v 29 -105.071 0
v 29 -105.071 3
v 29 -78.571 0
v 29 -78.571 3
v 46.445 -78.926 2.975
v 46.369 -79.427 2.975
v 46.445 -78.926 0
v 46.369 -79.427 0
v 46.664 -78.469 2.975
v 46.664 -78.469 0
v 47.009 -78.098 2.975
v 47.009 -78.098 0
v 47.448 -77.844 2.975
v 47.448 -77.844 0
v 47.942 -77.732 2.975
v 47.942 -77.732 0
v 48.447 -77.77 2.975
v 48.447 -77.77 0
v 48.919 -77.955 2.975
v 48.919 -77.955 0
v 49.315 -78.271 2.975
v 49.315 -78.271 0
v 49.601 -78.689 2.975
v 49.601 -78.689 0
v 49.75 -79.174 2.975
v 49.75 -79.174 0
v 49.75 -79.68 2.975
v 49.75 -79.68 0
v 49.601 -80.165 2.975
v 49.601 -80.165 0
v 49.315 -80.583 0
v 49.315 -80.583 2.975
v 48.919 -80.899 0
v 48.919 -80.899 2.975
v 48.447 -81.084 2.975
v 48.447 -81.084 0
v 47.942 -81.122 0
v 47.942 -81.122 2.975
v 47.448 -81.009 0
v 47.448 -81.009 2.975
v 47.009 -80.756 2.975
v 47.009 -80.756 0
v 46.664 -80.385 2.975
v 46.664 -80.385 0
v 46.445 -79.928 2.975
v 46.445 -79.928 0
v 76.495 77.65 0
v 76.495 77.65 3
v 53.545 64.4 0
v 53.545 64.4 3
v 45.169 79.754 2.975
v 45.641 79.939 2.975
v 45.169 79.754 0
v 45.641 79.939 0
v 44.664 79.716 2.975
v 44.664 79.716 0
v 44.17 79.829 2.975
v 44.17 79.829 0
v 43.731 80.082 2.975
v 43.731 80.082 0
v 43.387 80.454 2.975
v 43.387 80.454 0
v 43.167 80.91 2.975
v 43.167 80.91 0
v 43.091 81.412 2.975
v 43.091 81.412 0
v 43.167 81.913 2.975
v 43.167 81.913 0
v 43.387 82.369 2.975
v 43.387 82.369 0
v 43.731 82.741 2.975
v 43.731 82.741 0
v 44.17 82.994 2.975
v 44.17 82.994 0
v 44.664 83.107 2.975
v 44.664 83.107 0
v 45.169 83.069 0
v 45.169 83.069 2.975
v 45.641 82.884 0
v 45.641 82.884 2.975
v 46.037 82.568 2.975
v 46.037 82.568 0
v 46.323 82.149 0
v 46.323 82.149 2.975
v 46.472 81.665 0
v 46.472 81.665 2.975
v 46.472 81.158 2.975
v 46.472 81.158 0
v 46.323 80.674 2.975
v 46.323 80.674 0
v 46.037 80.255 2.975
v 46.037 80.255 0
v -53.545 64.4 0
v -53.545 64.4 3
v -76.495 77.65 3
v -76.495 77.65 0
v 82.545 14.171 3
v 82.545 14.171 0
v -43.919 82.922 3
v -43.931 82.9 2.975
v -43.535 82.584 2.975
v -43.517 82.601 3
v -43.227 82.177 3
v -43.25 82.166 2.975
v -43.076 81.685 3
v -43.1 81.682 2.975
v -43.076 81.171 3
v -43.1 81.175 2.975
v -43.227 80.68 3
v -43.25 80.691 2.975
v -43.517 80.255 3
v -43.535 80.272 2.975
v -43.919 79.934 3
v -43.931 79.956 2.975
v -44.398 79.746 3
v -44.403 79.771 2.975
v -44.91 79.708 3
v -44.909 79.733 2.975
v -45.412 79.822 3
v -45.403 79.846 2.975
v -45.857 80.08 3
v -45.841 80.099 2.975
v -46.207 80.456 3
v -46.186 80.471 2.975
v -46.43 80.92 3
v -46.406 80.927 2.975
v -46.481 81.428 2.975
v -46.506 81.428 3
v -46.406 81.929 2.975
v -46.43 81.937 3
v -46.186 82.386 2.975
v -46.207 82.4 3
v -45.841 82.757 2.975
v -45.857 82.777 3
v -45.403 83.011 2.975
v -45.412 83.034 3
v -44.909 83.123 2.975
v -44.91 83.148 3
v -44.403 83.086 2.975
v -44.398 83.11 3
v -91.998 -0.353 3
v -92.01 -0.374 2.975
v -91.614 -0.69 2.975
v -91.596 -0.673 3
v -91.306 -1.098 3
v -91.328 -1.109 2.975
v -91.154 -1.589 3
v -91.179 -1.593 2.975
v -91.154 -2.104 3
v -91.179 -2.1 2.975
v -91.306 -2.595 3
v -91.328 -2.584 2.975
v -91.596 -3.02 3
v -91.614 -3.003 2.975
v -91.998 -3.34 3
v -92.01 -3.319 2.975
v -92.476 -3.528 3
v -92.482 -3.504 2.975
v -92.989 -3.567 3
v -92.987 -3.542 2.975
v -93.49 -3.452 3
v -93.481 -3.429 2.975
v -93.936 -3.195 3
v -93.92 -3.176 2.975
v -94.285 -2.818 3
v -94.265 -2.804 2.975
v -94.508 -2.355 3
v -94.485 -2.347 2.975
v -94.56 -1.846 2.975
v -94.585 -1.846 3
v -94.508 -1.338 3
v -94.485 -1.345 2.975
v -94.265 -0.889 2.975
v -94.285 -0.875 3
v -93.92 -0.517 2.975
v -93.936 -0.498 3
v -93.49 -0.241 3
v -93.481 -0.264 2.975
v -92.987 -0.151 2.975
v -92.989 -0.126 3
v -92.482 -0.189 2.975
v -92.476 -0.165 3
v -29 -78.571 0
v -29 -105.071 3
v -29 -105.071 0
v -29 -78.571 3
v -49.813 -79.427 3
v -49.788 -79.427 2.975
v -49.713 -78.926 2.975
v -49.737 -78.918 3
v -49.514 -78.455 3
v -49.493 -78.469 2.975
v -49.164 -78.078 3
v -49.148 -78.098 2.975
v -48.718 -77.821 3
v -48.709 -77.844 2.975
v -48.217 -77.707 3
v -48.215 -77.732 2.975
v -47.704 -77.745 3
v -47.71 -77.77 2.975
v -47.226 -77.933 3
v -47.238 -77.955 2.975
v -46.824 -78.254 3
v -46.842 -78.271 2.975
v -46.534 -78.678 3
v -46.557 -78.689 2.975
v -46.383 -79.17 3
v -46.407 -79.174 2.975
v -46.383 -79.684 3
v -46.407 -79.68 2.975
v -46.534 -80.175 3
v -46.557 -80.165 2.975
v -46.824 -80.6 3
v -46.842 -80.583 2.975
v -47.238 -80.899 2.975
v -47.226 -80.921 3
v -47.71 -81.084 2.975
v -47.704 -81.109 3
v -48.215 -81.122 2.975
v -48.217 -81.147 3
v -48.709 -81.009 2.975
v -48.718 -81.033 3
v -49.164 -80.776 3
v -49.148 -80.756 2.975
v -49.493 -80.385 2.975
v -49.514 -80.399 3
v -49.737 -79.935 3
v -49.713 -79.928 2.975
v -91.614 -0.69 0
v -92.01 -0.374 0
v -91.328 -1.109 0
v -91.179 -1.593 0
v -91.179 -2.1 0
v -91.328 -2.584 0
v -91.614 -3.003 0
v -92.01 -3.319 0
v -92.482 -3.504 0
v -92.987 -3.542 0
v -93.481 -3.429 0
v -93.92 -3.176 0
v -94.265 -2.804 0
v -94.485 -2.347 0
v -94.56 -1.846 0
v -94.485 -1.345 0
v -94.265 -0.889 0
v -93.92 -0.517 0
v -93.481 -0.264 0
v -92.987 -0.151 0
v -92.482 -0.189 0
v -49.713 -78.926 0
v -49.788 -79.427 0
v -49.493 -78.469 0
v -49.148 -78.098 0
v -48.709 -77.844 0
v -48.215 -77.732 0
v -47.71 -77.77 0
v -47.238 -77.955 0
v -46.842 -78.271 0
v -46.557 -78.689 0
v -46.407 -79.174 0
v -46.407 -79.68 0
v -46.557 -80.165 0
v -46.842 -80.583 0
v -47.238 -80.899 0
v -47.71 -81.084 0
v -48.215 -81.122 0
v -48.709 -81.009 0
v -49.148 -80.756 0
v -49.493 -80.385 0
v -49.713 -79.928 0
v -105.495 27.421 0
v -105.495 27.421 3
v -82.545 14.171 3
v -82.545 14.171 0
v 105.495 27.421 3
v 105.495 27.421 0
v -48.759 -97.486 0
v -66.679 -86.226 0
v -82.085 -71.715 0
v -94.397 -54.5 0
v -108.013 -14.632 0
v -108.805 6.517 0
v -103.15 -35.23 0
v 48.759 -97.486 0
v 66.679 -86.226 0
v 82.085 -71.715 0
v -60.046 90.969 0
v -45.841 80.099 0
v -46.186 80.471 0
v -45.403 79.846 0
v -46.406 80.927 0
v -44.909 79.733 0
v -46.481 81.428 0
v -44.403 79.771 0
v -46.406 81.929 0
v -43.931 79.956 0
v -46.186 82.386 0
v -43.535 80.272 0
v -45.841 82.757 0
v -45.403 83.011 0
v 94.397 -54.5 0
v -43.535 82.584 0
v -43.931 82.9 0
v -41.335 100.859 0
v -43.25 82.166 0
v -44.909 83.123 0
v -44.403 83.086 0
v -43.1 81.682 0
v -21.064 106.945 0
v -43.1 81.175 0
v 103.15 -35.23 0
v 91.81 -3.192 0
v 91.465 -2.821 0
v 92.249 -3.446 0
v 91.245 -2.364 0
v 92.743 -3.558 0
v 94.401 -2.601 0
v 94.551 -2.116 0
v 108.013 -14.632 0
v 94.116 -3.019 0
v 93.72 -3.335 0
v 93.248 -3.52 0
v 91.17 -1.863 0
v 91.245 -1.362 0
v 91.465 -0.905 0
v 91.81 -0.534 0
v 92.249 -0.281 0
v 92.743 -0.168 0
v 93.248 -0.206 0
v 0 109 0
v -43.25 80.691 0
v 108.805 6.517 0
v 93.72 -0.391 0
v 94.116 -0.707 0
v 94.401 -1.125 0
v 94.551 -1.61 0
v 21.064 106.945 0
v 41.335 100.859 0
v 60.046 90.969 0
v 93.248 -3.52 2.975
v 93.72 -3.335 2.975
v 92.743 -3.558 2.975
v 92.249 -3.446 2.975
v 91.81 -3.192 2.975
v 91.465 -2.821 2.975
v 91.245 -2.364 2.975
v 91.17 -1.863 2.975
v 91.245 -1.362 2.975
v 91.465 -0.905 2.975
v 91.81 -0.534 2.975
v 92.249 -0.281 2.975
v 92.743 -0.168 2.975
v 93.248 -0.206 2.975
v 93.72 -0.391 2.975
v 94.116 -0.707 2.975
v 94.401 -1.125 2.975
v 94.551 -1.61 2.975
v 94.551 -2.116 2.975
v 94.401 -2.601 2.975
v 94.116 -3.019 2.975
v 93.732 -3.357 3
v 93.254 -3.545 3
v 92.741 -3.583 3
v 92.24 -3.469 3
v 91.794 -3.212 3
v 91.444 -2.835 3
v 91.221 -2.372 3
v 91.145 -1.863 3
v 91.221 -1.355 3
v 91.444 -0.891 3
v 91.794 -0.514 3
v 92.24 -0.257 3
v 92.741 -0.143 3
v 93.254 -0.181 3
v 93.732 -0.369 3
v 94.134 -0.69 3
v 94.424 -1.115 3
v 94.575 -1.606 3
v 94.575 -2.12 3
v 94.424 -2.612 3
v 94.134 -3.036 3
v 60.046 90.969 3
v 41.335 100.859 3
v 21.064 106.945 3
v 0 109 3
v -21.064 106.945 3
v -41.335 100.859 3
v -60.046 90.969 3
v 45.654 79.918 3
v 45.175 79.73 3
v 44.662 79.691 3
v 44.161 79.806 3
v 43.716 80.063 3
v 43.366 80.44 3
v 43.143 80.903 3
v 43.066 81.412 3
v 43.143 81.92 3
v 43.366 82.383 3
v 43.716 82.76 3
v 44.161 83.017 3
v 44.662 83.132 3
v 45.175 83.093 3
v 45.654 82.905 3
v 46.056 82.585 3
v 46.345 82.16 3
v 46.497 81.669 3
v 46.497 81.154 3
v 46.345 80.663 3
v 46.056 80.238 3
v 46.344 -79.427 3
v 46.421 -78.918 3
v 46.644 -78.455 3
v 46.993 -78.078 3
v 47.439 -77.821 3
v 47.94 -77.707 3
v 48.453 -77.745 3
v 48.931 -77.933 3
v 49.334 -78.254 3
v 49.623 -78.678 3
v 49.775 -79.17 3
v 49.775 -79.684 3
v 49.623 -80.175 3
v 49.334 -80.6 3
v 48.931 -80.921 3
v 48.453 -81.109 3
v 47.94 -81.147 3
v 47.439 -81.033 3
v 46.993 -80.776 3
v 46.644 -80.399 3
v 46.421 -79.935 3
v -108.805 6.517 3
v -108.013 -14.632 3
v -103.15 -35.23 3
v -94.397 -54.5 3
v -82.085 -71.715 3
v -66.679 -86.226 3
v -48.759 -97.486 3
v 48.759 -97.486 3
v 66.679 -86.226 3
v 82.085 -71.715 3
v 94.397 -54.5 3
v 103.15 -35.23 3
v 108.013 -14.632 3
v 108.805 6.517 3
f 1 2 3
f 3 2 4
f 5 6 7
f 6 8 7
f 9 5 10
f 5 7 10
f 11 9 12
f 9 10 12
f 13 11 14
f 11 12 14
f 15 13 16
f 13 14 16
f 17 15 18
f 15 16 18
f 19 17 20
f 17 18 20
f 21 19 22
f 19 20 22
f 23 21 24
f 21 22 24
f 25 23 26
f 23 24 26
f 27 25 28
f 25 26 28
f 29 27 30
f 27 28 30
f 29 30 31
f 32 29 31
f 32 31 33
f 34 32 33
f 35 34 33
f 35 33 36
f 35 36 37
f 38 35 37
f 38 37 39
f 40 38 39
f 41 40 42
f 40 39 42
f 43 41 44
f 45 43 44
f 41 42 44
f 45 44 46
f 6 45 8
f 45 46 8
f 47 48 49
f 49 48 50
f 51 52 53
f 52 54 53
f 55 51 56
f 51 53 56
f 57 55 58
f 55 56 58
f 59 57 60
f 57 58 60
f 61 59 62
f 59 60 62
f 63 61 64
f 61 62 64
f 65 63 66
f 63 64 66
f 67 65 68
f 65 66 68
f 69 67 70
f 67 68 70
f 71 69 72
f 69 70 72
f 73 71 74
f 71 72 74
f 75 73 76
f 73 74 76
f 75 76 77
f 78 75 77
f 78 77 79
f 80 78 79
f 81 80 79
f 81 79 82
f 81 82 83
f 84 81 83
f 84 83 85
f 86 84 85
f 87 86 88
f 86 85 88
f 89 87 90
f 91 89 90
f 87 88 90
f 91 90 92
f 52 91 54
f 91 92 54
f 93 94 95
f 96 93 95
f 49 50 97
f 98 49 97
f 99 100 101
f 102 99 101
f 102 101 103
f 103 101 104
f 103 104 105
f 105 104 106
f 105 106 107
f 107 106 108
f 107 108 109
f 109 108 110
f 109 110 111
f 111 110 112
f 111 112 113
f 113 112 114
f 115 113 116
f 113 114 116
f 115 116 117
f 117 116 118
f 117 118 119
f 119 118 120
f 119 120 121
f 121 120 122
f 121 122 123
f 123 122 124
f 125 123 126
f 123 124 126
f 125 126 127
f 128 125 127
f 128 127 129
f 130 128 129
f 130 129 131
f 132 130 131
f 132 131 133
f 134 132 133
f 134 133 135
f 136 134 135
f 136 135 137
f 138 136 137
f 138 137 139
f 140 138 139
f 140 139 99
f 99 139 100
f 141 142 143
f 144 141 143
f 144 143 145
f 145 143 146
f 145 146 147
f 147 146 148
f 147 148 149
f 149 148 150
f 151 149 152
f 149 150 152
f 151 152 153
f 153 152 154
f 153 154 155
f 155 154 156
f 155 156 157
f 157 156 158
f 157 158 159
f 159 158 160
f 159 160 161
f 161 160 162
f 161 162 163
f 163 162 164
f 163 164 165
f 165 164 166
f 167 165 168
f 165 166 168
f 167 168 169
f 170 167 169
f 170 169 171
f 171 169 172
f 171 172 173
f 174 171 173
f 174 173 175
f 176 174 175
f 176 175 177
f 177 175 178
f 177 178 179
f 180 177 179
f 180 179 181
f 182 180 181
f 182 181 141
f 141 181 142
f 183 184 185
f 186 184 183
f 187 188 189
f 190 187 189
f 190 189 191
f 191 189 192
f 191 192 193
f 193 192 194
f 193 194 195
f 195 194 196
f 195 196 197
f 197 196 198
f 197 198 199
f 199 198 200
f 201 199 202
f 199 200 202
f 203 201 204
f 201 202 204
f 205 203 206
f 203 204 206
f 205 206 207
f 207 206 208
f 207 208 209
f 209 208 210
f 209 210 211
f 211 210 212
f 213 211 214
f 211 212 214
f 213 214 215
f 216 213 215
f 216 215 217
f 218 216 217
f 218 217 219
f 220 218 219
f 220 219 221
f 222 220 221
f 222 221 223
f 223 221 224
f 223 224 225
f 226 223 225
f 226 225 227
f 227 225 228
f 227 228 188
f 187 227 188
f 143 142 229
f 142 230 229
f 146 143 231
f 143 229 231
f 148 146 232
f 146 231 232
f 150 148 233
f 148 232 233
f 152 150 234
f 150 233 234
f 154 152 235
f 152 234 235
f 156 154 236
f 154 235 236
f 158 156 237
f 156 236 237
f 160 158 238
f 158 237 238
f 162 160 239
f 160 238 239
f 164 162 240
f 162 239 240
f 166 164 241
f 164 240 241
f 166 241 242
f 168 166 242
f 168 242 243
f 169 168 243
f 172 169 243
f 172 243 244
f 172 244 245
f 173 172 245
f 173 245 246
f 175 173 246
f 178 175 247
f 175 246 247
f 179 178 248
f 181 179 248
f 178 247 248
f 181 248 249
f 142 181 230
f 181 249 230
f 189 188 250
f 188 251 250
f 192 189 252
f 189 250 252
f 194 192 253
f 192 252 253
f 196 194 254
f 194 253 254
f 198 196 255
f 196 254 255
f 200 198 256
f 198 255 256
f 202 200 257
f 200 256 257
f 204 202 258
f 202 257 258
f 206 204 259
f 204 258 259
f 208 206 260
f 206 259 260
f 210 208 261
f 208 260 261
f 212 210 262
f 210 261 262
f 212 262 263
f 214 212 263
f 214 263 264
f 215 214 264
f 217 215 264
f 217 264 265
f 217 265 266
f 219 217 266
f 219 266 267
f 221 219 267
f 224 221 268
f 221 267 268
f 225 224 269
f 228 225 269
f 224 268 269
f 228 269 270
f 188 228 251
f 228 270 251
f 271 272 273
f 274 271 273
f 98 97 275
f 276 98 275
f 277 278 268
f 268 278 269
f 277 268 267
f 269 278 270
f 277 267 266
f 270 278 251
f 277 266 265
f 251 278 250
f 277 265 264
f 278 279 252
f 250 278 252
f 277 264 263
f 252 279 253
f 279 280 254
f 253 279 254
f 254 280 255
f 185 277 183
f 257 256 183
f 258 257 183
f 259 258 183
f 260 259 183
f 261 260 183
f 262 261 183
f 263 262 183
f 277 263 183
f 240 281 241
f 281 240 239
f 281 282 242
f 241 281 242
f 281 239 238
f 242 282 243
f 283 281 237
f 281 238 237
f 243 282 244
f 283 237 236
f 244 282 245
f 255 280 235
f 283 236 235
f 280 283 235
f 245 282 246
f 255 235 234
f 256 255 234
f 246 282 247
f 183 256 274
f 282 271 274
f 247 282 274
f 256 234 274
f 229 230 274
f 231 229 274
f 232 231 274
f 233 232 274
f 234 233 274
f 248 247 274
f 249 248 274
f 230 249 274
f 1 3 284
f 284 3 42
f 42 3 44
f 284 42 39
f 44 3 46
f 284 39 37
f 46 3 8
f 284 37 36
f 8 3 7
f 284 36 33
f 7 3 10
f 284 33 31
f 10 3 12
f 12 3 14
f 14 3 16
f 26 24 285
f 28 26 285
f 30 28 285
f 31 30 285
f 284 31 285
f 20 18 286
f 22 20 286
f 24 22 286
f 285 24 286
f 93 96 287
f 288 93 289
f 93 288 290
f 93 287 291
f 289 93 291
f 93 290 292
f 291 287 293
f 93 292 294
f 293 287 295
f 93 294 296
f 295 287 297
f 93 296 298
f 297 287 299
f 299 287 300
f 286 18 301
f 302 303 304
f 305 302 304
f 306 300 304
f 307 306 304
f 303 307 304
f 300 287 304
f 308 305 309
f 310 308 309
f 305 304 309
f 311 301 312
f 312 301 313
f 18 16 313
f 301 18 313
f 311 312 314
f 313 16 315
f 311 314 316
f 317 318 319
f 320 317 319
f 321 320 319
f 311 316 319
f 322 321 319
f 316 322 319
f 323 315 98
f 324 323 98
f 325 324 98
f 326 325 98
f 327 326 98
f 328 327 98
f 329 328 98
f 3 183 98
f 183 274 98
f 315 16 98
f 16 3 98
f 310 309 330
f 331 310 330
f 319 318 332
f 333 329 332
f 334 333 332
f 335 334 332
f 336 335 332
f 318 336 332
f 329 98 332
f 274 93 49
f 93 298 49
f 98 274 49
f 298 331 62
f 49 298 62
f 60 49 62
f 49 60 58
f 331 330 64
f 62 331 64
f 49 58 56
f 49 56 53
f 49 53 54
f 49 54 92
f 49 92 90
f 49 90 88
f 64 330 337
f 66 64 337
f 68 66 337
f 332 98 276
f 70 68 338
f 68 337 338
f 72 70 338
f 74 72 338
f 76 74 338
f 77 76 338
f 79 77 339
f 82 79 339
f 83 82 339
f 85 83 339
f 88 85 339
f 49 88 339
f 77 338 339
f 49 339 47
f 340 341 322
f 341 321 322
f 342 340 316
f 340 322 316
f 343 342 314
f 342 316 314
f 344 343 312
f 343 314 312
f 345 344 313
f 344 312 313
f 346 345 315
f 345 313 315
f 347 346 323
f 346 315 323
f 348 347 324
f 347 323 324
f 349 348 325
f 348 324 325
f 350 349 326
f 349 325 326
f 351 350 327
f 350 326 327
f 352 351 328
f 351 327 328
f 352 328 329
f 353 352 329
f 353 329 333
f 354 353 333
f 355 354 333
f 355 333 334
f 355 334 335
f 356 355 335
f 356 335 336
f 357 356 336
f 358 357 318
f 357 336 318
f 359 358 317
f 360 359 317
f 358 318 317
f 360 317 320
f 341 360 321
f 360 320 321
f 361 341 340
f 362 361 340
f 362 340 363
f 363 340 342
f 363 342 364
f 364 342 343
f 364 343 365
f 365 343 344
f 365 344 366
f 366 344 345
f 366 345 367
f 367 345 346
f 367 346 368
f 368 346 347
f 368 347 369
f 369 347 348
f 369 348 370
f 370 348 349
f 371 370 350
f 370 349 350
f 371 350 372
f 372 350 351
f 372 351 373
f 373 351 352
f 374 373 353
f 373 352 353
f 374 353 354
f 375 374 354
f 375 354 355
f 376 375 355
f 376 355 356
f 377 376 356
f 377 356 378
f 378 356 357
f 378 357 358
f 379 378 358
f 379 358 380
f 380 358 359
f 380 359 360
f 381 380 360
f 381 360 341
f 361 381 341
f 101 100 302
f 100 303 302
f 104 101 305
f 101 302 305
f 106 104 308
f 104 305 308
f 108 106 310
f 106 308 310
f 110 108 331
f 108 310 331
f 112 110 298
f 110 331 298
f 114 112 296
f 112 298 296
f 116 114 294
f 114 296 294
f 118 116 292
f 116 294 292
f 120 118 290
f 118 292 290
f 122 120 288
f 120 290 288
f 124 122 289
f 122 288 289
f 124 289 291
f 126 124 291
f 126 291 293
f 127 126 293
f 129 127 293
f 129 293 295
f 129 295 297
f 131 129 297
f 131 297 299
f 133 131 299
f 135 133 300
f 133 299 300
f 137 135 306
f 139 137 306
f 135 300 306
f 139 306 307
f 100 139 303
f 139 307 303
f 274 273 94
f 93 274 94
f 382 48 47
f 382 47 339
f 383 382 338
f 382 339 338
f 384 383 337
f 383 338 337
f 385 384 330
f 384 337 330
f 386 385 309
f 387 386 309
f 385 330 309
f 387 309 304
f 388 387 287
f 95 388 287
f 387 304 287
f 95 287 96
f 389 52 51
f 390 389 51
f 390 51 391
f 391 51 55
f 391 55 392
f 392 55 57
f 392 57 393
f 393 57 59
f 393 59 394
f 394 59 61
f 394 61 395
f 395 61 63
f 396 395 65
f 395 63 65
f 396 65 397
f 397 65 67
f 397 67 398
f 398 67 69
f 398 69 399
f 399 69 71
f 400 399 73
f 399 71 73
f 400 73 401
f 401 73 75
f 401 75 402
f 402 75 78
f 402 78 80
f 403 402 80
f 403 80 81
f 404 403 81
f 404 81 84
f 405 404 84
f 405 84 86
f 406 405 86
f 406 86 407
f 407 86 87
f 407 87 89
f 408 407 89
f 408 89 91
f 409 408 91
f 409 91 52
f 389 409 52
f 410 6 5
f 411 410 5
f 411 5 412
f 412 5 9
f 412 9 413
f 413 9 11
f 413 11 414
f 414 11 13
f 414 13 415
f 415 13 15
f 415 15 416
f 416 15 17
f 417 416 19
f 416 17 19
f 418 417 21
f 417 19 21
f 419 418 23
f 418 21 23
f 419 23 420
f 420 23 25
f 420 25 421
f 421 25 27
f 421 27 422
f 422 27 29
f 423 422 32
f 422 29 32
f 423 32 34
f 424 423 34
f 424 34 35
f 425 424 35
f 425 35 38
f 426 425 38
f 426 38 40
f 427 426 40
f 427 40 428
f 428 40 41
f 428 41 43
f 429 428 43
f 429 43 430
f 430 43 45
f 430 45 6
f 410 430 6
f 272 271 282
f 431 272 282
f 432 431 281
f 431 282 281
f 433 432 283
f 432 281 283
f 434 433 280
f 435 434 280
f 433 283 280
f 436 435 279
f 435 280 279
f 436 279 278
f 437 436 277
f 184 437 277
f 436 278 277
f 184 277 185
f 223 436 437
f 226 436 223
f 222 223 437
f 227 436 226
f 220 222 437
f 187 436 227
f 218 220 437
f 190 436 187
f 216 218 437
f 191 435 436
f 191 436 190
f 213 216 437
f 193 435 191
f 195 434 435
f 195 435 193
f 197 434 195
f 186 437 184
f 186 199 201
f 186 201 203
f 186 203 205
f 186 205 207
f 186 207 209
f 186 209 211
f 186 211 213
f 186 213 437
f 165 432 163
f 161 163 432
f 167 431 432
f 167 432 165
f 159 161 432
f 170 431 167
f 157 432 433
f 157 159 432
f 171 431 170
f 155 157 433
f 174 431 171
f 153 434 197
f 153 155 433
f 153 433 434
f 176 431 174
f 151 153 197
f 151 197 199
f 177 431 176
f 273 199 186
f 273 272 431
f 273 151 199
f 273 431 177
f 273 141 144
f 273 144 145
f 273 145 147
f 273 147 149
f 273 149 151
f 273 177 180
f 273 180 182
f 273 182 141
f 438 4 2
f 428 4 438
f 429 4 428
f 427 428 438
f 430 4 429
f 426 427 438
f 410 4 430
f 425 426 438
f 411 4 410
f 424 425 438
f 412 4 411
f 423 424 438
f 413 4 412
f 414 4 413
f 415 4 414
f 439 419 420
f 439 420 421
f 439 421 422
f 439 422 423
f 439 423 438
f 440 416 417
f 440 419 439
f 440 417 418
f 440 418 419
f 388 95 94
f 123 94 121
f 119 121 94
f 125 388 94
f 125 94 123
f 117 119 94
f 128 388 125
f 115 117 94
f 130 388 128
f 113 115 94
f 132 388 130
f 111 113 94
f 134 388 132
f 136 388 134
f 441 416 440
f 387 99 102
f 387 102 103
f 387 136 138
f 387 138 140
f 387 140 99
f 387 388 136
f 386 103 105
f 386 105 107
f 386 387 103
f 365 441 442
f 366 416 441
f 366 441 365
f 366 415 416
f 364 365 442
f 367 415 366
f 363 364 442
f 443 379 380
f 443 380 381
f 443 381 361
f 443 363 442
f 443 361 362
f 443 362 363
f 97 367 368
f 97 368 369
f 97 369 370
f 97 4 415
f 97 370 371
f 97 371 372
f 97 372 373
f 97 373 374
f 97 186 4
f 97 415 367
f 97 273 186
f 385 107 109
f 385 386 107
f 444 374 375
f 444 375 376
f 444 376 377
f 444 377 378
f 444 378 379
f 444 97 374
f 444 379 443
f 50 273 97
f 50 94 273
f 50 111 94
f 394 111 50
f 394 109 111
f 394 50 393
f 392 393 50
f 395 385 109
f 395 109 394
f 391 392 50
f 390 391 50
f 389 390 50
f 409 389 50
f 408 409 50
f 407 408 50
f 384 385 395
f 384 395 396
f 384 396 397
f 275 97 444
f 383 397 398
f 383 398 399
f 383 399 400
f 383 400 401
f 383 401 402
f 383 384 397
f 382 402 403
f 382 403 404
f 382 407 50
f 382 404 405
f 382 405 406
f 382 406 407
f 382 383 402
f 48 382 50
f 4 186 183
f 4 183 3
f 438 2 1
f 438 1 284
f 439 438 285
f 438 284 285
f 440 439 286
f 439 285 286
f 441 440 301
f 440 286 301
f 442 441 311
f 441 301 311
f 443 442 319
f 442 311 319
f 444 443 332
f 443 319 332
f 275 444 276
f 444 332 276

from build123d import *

# Parameters (mm, degrees)
ESQUISSE2_R                  = 109
BOSS_EXTRU_1_DEPTH           = 3
ESQUISSE3_W                  = 58
ESQUISSE3_H                  = 42.41769301
ENL_V_MAT_EXTRU_1_DEPTH      = 3
D_GAGEMENT_M31_D             = 3.4
D_GAGEMENT_M31_CSINK_D       = 3.45
D_GAGEMENT_M31_CSINK_ANGLE   = 90
R_P_TITION_CIRCULAIRE1_COUNT = 3


with BuildPart() as part:
    # Esquisse2 → Boss.-Extru.1 (new body)
    with BuildSketch(Plane.XY):
        Circle(ESQUISSE2_R)
    extrude(amount=BOSS_EXTRU_1_DEPTH)

    # Esquisse3 → Enlèv. mat.-Extru.1 (cut)
    with BuildSketch(Plane.XY.offset(3)):
        with Locations((0, -99.780250798)):
            Rectangle(ESQUISSE3_W, ESQUISSE3_H)
        Polygon((-90.279631846, 85.609285361), (-119.279631846, 35.379811942), (-82.544832128, 14.170965437), (-53.544832128, 64.400438856), align=None)
        Polygon((119.279631846, 35.379811942), (90.279631846, 85.609285361), (53.544832128, 64.400438856), (82.544832128, 14.170965437), align=None)
    extrude(amount=-ENL_V_MAT_EXTRU_1_DEPTH, mode=Mode.SUBTRACT)

    # Dégagement M31 (through all)
    with Locations(Plane.XY.offset(3)):
        with Locations((-48.088245044, -79.426901276), (48.068989794, -79.426901276)):
            d_gagement_m31 = CounterSinkHole(D_GAGEMENT_M31_D / 2, D_GAGEMENT_M31_CSINK_D / 2, counter_sink_angle=D_GAGEMENT_M31_CSINK_ANGLE)

    # Répétition circulaire1: Dégagement M31 ×3 about axis
    r_p_tition_circulaire1_axis = Axis((5.584e-06, 0.046063312, 0), (0, 0, 1))
    for i in range(1, R_P_TITION_CIRCULAIRE1_COUNT):
        add(d_gagement_m31.rotate(r_p_tition_circulaire1_axis, i * 360 / R_P_TITION_CIRCULAIRE1_COUNT), mode=Mode.SUBTRACT)


solid = part.part
